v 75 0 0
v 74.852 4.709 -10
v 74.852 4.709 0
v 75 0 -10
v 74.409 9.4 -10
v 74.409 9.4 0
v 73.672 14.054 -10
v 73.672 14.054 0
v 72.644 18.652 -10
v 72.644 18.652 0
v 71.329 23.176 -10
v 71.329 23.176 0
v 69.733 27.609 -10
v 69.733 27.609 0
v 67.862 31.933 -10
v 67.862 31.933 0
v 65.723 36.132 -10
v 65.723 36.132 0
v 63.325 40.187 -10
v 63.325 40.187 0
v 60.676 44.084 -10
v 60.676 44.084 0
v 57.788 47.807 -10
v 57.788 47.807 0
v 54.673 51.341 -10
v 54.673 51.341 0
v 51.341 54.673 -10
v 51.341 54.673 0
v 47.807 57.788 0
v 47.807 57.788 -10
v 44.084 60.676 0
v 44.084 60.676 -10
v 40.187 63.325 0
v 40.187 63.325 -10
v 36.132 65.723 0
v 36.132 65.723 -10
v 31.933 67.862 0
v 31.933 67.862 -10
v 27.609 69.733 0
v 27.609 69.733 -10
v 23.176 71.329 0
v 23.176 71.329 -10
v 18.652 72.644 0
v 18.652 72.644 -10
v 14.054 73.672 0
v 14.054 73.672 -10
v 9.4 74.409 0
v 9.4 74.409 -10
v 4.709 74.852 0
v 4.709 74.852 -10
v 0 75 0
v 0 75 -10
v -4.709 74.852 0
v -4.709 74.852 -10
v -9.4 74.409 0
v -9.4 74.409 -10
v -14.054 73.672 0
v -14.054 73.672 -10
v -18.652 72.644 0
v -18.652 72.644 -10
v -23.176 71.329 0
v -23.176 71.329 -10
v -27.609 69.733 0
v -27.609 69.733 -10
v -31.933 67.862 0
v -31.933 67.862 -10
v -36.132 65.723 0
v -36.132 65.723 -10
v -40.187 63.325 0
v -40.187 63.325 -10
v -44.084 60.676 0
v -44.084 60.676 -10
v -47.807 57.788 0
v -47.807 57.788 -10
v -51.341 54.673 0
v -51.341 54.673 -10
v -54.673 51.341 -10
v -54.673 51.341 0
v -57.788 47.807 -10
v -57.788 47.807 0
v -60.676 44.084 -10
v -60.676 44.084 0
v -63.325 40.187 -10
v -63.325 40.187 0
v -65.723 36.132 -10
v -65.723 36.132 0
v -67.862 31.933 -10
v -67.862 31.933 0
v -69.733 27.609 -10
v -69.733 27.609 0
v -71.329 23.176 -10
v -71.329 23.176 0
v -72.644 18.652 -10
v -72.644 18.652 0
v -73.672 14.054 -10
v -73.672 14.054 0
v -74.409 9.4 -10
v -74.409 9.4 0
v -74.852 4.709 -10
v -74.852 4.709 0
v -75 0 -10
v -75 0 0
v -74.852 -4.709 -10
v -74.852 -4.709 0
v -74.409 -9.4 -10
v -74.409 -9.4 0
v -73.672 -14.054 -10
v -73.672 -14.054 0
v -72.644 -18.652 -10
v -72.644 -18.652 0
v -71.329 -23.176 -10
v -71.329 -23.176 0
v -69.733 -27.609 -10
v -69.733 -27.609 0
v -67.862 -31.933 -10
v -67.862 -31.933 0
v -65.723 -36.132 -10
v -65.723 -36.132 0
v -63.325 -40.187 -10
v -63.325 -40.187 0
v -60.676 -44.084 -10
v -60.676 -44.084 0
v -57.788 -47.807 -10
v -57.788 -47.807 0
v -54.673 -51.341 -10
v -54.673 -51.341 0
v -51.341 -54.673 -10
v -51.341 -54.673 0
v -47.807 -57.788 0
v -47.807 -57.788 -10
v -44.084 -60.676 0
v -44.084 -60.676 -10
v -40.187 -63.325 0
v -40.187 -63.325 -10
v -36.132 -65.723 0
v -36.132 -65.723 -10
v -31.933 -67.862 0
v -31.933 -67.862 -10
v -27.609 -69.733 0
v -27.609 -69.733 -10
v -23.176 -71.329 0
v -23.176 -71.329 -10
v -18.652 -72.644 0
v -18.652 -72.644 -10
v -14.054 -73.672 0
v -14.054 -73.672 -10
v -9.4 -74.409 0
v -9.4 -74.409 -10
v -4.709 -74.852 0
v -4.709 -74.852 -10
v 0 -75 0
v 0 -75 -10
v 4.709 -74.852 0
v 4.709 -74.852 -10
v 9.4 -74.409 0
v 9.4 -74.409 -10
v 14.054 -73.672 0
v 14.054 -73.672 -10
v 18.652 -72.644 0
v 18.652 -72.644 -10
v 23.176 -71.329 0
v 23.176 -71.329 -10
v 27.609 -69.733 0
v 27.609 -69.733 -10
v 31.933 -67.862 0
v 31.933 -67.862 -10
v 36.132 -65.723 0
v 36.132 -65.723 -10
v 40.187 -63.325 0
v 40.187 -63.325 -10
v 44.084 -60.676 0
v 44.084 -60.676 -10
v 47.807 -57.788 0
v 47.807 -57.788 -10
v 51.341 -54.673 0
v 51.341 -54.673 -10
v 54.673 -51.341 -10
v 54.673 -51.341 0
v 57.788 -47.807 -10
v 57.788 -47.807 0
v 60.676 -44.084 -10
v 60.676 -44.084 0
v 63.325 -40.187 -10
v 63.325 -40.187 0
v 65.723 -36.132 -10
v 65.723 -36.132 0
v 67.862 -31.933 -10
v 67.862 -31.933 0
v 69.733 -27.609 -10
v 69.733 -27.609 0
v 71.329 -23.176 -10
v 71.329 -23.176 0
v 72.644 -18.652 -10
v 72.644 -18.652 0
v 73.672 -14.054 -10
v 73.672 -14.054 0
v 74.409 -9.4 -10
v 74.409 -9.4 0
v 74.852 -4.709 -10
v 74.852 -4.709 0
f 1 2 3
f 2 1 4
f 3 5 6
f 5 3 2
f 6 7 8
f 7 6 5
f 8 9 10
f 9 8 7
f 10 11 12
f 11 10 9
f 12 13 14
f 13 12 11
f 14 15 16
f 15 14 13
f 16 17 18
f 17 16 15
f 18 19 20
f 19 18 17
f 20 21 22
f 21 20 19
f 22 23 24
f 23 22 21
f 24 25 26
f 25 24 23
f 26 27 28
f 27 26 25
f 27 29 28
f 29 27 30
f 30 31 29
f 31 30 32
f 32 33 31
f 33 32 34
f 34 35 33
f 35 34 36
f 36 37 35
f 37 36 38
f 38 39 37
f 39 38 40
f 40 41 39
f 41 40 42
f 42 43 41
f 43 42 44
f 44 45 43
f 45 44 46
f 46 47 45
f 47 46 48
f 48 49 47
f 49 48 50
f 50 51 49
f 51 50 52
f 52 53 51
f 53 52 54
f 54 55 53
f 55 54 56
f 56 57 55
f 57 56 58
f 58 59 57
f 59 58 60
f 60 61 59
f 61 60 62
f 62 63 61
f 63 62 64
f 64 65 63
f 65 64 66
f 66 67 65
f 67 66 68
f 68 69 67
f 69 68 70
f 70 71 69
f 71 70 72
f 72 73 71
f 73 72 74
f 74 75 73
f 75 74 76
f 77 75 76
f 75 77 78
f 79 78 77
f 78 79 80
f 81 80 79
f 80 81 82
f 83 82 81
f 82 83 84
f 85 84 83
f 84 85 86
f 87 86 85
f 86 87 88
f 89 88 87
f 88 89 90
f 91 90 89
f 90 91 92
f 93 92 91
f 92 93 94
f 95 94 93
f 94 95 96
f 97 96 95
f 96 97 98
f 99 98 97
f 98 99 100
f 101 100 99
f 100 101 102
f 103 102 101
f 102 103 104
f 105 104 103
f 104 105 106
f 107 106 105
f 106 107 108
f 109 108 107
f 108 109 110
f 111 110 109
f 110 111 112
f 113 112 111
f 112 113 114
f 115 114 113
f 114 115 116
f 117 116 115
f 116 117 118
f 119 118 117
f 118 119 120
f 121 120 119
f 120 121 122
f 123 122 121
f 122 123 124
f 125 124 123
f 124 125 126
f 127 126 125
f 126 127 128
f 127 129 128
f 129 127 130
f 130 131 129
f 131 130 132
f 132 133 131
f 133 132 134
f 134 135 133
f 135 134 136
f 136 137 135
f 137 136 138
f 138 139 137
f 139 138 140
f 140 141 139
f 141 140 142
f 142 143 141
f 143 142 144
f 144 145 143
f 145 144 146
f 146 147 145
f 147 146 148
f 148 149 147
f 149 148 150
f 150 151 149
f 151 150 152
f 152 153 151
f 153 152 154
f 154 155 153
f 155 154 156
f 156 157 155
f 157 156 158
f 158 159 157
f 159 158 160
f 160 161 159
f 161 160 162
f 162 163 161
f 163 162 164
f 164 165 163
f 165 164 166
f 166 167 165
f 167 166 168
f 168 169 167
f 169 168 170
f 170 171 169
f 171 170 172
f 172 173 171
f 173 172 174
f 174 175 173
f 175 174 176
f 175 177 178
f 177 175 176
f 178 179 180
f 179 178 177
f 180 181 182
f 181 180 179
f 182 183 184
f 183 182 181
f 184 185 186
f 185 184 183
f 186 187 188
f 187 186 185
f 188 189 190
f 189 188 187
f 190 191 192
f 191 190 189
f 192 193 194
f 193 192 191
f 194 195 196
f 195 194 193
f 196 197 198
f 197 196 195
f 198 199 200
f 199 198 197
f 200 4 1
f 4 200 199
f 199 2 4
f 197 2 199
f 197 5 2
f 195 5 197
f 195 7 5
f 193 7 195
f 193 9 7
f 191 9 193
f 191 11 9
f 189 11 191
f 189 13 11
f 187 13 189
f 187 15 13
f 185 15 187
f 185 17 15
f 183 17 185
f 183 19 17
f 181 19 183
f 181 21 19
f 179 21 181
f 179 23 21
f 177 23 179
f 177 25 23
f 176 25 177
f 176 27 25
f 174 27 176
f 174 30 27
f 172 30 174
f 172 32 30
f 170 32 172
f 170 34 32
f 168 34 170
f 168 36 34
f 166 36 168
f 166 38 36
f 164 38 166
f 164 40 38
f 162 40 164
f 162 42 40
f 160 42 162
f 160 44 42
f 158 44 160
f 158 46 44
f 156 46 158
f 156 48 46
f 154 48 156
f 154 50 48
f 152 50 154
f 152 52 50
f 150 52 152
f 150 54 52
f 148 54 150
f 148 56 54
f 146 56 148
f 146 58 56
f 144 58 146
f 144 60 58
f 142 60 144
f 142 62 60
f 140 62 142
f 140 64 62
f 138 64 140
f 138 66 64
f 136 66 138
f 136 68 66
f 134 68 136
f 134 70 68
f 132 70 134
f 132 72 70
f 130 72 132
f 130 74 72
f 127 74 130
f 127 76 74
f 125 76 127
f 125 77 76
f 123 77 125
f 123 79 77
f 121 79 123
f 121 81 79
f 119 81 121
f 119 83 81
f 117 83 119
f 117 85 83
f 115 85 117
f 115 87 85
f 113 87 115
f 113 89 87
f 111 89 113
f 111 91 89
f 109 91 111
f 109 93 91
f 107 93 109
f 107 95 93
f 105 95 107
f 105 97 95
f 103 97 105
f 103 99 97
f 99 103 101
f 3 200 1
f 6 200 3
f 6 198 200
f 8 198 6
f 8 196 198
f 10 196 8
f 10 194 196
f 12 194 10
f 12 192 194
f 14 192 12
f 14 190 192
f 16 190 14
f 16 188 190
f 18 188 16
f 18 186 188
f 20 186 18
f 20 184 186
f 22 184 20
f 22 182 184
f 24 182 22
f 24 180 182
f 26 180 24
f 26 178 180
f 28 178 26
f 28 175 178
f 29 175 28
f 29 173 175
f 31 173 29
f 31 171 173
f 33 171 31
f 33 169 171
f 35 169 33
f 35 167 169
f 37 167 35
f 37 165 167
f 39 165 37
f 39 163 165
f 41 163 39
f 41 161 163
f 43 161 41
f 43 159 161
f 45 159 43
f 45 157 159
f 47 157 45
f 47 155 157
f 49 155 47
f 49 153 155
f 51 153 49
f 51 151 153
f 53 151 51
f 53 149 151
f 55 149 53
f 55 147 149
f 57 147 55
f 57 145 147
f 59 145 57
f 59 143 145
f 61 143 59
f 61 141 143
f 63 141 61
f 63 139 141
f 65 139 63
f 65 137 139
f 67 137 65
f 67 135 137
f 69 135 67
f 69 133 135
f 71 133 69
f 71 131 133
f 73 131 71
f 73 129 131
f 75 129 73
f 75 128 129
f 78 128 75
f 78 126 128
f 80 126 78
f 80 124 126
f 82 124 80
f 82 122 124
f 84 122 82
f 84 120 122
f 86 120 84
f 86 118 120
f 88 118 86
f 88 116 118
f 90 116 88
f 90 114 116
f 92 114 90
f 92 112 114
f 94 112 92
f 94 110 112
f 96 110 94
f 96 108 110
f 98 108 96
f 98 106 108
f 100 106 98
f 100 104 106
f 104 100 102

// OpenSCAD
// file: settings.scad
// Common settings used by all scad files.

// ALL UNITS IN MILLIMETERS (MM)!!!

$fn = 30;//low-res but fast to render
//$fn = 50;//higher-res but slow to render

pi = 3.1415926535897932384626433832795;

max_footprint = 150; // 15x15 cm

bottom_clearance = 10;
bottom_clearance = 25.4/2+10;
//bottom_clearance = 30;

shell_alpha = 0.215;
//shell_alpha = 1.0;

tolerance = 0.5;

// Flat countersunk M2.5mm x 0.45mm machine screw.
screw_thread_diameter = 2.5;//2.8;//2.75;//2.4?
screw_thread_length = 5;//?
screw_head_diameter = 4.75; // M2.5
//screw_head_diameter = 5.2; // M3
screw_head_height = 1.5;//2;

screw_thread_diameter2 = 2;

unit_thickness = 5;
u = unit_thickness;

shell_thickness = unit_thickness;

// Show flags.
show_platform = 0;
show_head = 1;
show_head_shell = 0;
show_head_electronics_bb = 0;
show_battery = 1;
show_foot_cube = 0;
show_torso = 0;
show_motor = 0;
show_motor_plates = 1;
show_motor_inner_plates = 1;
show_motor_outer_plates = 1;
show_wheel = 0;//obsolete
show_tracks = 1;//
show_track_wheels = 1;
show_caster = 0;
show_rpi = 1;
show_vertical_plates = 1;//
show_horizontal_plates = 1;//
show_caster_plates = 0;//obsolete?
show_camera = 1;
show_screen = 0;
show_edge_mount = 1;
show_sonar_mount = 1;
show_recharge_mount = 1;
show_conduit = 1;
show_torso_shell = 1;
show_recharge_dock = 0;
show_head_tilt_axis = 0;
show_rpi_camera_axis = 0;
show_laser_axis = 0;

head_vertical_angle_tilt = 0;
//head_vertical_angle_tilt = 30;//max
//head_vertical_angle_tilt = 10;

torso_height = 120+20;

base_plate_diameter = max_footprint-unit_thickness*2;
base_plate_frame = 0;

head_height = 50;
head_offset_z = max_footprint/2;
head_middle_cutout = 85;

rpi_with_four_hats_and_clearance = 76;

qrd1114_w = 6.10;
qrd1114_l = 4.39;
qrd1114_h = 4.65;

dock_radius = 10;
dock_gripper_border = 2;
dock_gripper_instep = 0.9;
dock_gripper_cutout_tapper = 50;
dock_receiver_height = 5;

// Patriod Fuel+ 9000 mAh
battery_length = 90;
battery_width = 57;
battery_height = 23;
battery_offset_z = 30;//4;

wheel_diameter = 50;
wheel_offset_x = 65;
wheel_offset_z = wheel_diameter/2;
wheel_axle_diameter = 5;

//caster_diameter = 19.05; // 0.75 inches
caster_diameter = 25.45; // 1 inches
//caster_diameter = 15.875; // 5/8 inches
caster_holder_diameter = 30;//31;
caster_offset_y = base_plate_diameter/2 - caster_holder_diameter/2;

arduino_offset_x = 0;
arduino_offset_y = 0;
arduino_offset_z = 67;
arduino_offset_x2 = 0;
arduino_offset_y2 = -20;
arduino_offset_z2 = torso_height+bottom_clearance;

horizontal_plate_width = unit_thickness*8*2 - unit_thickness*2;
horizontal_plate_depth = unit_thickness*8*2;

vertical_plate_width = horizontal_plate_depth;
vertical_plate_height = unit_thickness*8;
vertical_plate_offset_x = wheel_offset_x-22.5;
vertical_plate_offset_z = vertical_plate_height/2 + unit_thickness/2;

vertical_battery_plate_height = 100 - 15;

caster_plate_width = horizontal_plate_width + unit_thickness*2;
caster_plate_mount_length = unit_thickness*4;
caster_plate_width_minor = caster_holder_diameter;

motor_switch_length = 20;
motor_switch_thickness = 6.5;
motor_switch_height = 11;
motor_switch_height_leads = 23;
motor_switch_on_height =  13.3;
motor_switch_hole_diameter = 2.5;
motor_switch_hole_offset_z = 6.5;//this plus diameter/2 is hole center from switch top
motor_switch_hole_spacing = 7.1;// holes are diameter/2 from this

motor_length = 60;
motor_width = 25;
motor_collar_width = 7;
motor_collar_height = 2.5;
motor_axle_width = 4;
motor_axle_height = 9.5;
motor_offset_x = 10;
//motor_offset_y = motor_width/2+5;
motor_offset_y = unit_thickness*3.5;
motor_offset_z = vertical_plate_height/2 - unit_thickness/2;//4;//30;
motor_mount_holes_dist = 17;
// motor countersink hole
motor_mount_holes_width = 3; // M3
motor_mount_holes_head_height = 2.2;
motor_mount_holes_head_width = 5.8;
motor_bearing_outer_diameter = 10;
motor_bearing_inner_diameter = 5.95;
motor_bearing_thickness = 2.5;

motor_unimount_idler_axle_d = screw_thread_diameter;
//motor_unimount_spacer_depth = 0.1;//too small
motor_unimount_spacer_depth = 0.5;

motor_arm_offset_y = -u*3;
motor_arm_offset_z = u*.5;

motor_plate_width = vertical_plate_width;
motor_plate_height = vertical_plate_height;
motor_plate_thickness = unit_thickness;
motor_plate_offset_z = vertical_plate_offset_z;

motor_plate_middle_thickness = 5;

wheel_hub_offset = u*3;

motor_hole_height_offset = -5;

nylon_spacer_outer_diameter = 6.35;
nylon_spacer_inner_diameter = 3.302;
nylon_spacer_length = 12.7;

track_width = unit_thickness*3;
track_offset_x = -50;
track_offset_z = .1;
//track_wheel_radius = 19;//original
track_wheel_radius = 14;
//track_wheel_hole_radius = (nylon_spacer_outer_diameter+1)/2;
track_wheel_hole_radius = motor_bearing_outer_diameter/2;

track_driver_hole_radius = (motor_axle_width)/2 + 0.1;
track_driver_set_screw_head_d = 4.1;
track_driver_set_screw_shaft_d = 2.4;
//track_wheel_width = 13.5;//original
track_wheel_width = u*2;
track_wheel_width_buffer = u*0.25;
track_offset = 3;        //distance from chassis
track_wheel_offset = track_offset;
//track_length = 250; // see tread_triangle.py, too big
//track_length = 240; // see tread_triangle.py
//track_length = 238; //inc/dec in 10 unit increments so notches match idlers
track_length = 228; //inc/dec in 10 unit increments so notches match idlers
track_radius = track_length/2/pi;
track_wheel_show_fancy = 1;
track_wheel_gap = track_wheel_width + track_wheel_width_buffer*2;
track_axle_bearing_diameter = motor_bearing_inner_diameter - 0.1;
track_tensioner_radius = 12;
track_nut_height = 3.5; //TODO
track_punchout_thickness = 0.25;//should be the same as the minimum layer thickness

head_slew_bearing_outer_diameter = 115;
head_slew_bearing_ring_thickness = 20;
head_slew_bearing_inner_diameter = head_slew_bearing_outer_diameter - head_slew_bearing_ring_thickness;
//head_slew_bearing_hole_diameter = head_slew_bearing_inner_diameter - head_slew_bearing_ring_thickness;
head_slew_bearing_hole_diameter = 12+tolerance; // slip ring https://www.adafruit.com/products/775
//head_slew_bearing_ball_diameter = 5;
head_slew_bearing_ball_diameter = 2.5; //u/2;
head_slew_bearing_height = u;//head_slew_bearing_ball_diameter*2;
head_slew_bearing_gap = 0.5;
head_slew_bearing_slew_gap = 0;
head_slew_bearing_gap_factor = 0.1;

neck_strut_width = u*7;
neck_strut_height = u*18;
neck_strut_spacing = u*8;

show_outer_race = 0;
show_inner_race_a = 1;
show_inner_race_b = 1;
show_balls = 0;
// main file
include <settings.scad>;

module make_platform(){
    color("gray")
    translate([0,0,-5])
    //cube([max_footprint,max_footprint,10], center=true);
    cylinder(h=10, d=max_footprint, center=true, $fn=100);
}

make_platform();
